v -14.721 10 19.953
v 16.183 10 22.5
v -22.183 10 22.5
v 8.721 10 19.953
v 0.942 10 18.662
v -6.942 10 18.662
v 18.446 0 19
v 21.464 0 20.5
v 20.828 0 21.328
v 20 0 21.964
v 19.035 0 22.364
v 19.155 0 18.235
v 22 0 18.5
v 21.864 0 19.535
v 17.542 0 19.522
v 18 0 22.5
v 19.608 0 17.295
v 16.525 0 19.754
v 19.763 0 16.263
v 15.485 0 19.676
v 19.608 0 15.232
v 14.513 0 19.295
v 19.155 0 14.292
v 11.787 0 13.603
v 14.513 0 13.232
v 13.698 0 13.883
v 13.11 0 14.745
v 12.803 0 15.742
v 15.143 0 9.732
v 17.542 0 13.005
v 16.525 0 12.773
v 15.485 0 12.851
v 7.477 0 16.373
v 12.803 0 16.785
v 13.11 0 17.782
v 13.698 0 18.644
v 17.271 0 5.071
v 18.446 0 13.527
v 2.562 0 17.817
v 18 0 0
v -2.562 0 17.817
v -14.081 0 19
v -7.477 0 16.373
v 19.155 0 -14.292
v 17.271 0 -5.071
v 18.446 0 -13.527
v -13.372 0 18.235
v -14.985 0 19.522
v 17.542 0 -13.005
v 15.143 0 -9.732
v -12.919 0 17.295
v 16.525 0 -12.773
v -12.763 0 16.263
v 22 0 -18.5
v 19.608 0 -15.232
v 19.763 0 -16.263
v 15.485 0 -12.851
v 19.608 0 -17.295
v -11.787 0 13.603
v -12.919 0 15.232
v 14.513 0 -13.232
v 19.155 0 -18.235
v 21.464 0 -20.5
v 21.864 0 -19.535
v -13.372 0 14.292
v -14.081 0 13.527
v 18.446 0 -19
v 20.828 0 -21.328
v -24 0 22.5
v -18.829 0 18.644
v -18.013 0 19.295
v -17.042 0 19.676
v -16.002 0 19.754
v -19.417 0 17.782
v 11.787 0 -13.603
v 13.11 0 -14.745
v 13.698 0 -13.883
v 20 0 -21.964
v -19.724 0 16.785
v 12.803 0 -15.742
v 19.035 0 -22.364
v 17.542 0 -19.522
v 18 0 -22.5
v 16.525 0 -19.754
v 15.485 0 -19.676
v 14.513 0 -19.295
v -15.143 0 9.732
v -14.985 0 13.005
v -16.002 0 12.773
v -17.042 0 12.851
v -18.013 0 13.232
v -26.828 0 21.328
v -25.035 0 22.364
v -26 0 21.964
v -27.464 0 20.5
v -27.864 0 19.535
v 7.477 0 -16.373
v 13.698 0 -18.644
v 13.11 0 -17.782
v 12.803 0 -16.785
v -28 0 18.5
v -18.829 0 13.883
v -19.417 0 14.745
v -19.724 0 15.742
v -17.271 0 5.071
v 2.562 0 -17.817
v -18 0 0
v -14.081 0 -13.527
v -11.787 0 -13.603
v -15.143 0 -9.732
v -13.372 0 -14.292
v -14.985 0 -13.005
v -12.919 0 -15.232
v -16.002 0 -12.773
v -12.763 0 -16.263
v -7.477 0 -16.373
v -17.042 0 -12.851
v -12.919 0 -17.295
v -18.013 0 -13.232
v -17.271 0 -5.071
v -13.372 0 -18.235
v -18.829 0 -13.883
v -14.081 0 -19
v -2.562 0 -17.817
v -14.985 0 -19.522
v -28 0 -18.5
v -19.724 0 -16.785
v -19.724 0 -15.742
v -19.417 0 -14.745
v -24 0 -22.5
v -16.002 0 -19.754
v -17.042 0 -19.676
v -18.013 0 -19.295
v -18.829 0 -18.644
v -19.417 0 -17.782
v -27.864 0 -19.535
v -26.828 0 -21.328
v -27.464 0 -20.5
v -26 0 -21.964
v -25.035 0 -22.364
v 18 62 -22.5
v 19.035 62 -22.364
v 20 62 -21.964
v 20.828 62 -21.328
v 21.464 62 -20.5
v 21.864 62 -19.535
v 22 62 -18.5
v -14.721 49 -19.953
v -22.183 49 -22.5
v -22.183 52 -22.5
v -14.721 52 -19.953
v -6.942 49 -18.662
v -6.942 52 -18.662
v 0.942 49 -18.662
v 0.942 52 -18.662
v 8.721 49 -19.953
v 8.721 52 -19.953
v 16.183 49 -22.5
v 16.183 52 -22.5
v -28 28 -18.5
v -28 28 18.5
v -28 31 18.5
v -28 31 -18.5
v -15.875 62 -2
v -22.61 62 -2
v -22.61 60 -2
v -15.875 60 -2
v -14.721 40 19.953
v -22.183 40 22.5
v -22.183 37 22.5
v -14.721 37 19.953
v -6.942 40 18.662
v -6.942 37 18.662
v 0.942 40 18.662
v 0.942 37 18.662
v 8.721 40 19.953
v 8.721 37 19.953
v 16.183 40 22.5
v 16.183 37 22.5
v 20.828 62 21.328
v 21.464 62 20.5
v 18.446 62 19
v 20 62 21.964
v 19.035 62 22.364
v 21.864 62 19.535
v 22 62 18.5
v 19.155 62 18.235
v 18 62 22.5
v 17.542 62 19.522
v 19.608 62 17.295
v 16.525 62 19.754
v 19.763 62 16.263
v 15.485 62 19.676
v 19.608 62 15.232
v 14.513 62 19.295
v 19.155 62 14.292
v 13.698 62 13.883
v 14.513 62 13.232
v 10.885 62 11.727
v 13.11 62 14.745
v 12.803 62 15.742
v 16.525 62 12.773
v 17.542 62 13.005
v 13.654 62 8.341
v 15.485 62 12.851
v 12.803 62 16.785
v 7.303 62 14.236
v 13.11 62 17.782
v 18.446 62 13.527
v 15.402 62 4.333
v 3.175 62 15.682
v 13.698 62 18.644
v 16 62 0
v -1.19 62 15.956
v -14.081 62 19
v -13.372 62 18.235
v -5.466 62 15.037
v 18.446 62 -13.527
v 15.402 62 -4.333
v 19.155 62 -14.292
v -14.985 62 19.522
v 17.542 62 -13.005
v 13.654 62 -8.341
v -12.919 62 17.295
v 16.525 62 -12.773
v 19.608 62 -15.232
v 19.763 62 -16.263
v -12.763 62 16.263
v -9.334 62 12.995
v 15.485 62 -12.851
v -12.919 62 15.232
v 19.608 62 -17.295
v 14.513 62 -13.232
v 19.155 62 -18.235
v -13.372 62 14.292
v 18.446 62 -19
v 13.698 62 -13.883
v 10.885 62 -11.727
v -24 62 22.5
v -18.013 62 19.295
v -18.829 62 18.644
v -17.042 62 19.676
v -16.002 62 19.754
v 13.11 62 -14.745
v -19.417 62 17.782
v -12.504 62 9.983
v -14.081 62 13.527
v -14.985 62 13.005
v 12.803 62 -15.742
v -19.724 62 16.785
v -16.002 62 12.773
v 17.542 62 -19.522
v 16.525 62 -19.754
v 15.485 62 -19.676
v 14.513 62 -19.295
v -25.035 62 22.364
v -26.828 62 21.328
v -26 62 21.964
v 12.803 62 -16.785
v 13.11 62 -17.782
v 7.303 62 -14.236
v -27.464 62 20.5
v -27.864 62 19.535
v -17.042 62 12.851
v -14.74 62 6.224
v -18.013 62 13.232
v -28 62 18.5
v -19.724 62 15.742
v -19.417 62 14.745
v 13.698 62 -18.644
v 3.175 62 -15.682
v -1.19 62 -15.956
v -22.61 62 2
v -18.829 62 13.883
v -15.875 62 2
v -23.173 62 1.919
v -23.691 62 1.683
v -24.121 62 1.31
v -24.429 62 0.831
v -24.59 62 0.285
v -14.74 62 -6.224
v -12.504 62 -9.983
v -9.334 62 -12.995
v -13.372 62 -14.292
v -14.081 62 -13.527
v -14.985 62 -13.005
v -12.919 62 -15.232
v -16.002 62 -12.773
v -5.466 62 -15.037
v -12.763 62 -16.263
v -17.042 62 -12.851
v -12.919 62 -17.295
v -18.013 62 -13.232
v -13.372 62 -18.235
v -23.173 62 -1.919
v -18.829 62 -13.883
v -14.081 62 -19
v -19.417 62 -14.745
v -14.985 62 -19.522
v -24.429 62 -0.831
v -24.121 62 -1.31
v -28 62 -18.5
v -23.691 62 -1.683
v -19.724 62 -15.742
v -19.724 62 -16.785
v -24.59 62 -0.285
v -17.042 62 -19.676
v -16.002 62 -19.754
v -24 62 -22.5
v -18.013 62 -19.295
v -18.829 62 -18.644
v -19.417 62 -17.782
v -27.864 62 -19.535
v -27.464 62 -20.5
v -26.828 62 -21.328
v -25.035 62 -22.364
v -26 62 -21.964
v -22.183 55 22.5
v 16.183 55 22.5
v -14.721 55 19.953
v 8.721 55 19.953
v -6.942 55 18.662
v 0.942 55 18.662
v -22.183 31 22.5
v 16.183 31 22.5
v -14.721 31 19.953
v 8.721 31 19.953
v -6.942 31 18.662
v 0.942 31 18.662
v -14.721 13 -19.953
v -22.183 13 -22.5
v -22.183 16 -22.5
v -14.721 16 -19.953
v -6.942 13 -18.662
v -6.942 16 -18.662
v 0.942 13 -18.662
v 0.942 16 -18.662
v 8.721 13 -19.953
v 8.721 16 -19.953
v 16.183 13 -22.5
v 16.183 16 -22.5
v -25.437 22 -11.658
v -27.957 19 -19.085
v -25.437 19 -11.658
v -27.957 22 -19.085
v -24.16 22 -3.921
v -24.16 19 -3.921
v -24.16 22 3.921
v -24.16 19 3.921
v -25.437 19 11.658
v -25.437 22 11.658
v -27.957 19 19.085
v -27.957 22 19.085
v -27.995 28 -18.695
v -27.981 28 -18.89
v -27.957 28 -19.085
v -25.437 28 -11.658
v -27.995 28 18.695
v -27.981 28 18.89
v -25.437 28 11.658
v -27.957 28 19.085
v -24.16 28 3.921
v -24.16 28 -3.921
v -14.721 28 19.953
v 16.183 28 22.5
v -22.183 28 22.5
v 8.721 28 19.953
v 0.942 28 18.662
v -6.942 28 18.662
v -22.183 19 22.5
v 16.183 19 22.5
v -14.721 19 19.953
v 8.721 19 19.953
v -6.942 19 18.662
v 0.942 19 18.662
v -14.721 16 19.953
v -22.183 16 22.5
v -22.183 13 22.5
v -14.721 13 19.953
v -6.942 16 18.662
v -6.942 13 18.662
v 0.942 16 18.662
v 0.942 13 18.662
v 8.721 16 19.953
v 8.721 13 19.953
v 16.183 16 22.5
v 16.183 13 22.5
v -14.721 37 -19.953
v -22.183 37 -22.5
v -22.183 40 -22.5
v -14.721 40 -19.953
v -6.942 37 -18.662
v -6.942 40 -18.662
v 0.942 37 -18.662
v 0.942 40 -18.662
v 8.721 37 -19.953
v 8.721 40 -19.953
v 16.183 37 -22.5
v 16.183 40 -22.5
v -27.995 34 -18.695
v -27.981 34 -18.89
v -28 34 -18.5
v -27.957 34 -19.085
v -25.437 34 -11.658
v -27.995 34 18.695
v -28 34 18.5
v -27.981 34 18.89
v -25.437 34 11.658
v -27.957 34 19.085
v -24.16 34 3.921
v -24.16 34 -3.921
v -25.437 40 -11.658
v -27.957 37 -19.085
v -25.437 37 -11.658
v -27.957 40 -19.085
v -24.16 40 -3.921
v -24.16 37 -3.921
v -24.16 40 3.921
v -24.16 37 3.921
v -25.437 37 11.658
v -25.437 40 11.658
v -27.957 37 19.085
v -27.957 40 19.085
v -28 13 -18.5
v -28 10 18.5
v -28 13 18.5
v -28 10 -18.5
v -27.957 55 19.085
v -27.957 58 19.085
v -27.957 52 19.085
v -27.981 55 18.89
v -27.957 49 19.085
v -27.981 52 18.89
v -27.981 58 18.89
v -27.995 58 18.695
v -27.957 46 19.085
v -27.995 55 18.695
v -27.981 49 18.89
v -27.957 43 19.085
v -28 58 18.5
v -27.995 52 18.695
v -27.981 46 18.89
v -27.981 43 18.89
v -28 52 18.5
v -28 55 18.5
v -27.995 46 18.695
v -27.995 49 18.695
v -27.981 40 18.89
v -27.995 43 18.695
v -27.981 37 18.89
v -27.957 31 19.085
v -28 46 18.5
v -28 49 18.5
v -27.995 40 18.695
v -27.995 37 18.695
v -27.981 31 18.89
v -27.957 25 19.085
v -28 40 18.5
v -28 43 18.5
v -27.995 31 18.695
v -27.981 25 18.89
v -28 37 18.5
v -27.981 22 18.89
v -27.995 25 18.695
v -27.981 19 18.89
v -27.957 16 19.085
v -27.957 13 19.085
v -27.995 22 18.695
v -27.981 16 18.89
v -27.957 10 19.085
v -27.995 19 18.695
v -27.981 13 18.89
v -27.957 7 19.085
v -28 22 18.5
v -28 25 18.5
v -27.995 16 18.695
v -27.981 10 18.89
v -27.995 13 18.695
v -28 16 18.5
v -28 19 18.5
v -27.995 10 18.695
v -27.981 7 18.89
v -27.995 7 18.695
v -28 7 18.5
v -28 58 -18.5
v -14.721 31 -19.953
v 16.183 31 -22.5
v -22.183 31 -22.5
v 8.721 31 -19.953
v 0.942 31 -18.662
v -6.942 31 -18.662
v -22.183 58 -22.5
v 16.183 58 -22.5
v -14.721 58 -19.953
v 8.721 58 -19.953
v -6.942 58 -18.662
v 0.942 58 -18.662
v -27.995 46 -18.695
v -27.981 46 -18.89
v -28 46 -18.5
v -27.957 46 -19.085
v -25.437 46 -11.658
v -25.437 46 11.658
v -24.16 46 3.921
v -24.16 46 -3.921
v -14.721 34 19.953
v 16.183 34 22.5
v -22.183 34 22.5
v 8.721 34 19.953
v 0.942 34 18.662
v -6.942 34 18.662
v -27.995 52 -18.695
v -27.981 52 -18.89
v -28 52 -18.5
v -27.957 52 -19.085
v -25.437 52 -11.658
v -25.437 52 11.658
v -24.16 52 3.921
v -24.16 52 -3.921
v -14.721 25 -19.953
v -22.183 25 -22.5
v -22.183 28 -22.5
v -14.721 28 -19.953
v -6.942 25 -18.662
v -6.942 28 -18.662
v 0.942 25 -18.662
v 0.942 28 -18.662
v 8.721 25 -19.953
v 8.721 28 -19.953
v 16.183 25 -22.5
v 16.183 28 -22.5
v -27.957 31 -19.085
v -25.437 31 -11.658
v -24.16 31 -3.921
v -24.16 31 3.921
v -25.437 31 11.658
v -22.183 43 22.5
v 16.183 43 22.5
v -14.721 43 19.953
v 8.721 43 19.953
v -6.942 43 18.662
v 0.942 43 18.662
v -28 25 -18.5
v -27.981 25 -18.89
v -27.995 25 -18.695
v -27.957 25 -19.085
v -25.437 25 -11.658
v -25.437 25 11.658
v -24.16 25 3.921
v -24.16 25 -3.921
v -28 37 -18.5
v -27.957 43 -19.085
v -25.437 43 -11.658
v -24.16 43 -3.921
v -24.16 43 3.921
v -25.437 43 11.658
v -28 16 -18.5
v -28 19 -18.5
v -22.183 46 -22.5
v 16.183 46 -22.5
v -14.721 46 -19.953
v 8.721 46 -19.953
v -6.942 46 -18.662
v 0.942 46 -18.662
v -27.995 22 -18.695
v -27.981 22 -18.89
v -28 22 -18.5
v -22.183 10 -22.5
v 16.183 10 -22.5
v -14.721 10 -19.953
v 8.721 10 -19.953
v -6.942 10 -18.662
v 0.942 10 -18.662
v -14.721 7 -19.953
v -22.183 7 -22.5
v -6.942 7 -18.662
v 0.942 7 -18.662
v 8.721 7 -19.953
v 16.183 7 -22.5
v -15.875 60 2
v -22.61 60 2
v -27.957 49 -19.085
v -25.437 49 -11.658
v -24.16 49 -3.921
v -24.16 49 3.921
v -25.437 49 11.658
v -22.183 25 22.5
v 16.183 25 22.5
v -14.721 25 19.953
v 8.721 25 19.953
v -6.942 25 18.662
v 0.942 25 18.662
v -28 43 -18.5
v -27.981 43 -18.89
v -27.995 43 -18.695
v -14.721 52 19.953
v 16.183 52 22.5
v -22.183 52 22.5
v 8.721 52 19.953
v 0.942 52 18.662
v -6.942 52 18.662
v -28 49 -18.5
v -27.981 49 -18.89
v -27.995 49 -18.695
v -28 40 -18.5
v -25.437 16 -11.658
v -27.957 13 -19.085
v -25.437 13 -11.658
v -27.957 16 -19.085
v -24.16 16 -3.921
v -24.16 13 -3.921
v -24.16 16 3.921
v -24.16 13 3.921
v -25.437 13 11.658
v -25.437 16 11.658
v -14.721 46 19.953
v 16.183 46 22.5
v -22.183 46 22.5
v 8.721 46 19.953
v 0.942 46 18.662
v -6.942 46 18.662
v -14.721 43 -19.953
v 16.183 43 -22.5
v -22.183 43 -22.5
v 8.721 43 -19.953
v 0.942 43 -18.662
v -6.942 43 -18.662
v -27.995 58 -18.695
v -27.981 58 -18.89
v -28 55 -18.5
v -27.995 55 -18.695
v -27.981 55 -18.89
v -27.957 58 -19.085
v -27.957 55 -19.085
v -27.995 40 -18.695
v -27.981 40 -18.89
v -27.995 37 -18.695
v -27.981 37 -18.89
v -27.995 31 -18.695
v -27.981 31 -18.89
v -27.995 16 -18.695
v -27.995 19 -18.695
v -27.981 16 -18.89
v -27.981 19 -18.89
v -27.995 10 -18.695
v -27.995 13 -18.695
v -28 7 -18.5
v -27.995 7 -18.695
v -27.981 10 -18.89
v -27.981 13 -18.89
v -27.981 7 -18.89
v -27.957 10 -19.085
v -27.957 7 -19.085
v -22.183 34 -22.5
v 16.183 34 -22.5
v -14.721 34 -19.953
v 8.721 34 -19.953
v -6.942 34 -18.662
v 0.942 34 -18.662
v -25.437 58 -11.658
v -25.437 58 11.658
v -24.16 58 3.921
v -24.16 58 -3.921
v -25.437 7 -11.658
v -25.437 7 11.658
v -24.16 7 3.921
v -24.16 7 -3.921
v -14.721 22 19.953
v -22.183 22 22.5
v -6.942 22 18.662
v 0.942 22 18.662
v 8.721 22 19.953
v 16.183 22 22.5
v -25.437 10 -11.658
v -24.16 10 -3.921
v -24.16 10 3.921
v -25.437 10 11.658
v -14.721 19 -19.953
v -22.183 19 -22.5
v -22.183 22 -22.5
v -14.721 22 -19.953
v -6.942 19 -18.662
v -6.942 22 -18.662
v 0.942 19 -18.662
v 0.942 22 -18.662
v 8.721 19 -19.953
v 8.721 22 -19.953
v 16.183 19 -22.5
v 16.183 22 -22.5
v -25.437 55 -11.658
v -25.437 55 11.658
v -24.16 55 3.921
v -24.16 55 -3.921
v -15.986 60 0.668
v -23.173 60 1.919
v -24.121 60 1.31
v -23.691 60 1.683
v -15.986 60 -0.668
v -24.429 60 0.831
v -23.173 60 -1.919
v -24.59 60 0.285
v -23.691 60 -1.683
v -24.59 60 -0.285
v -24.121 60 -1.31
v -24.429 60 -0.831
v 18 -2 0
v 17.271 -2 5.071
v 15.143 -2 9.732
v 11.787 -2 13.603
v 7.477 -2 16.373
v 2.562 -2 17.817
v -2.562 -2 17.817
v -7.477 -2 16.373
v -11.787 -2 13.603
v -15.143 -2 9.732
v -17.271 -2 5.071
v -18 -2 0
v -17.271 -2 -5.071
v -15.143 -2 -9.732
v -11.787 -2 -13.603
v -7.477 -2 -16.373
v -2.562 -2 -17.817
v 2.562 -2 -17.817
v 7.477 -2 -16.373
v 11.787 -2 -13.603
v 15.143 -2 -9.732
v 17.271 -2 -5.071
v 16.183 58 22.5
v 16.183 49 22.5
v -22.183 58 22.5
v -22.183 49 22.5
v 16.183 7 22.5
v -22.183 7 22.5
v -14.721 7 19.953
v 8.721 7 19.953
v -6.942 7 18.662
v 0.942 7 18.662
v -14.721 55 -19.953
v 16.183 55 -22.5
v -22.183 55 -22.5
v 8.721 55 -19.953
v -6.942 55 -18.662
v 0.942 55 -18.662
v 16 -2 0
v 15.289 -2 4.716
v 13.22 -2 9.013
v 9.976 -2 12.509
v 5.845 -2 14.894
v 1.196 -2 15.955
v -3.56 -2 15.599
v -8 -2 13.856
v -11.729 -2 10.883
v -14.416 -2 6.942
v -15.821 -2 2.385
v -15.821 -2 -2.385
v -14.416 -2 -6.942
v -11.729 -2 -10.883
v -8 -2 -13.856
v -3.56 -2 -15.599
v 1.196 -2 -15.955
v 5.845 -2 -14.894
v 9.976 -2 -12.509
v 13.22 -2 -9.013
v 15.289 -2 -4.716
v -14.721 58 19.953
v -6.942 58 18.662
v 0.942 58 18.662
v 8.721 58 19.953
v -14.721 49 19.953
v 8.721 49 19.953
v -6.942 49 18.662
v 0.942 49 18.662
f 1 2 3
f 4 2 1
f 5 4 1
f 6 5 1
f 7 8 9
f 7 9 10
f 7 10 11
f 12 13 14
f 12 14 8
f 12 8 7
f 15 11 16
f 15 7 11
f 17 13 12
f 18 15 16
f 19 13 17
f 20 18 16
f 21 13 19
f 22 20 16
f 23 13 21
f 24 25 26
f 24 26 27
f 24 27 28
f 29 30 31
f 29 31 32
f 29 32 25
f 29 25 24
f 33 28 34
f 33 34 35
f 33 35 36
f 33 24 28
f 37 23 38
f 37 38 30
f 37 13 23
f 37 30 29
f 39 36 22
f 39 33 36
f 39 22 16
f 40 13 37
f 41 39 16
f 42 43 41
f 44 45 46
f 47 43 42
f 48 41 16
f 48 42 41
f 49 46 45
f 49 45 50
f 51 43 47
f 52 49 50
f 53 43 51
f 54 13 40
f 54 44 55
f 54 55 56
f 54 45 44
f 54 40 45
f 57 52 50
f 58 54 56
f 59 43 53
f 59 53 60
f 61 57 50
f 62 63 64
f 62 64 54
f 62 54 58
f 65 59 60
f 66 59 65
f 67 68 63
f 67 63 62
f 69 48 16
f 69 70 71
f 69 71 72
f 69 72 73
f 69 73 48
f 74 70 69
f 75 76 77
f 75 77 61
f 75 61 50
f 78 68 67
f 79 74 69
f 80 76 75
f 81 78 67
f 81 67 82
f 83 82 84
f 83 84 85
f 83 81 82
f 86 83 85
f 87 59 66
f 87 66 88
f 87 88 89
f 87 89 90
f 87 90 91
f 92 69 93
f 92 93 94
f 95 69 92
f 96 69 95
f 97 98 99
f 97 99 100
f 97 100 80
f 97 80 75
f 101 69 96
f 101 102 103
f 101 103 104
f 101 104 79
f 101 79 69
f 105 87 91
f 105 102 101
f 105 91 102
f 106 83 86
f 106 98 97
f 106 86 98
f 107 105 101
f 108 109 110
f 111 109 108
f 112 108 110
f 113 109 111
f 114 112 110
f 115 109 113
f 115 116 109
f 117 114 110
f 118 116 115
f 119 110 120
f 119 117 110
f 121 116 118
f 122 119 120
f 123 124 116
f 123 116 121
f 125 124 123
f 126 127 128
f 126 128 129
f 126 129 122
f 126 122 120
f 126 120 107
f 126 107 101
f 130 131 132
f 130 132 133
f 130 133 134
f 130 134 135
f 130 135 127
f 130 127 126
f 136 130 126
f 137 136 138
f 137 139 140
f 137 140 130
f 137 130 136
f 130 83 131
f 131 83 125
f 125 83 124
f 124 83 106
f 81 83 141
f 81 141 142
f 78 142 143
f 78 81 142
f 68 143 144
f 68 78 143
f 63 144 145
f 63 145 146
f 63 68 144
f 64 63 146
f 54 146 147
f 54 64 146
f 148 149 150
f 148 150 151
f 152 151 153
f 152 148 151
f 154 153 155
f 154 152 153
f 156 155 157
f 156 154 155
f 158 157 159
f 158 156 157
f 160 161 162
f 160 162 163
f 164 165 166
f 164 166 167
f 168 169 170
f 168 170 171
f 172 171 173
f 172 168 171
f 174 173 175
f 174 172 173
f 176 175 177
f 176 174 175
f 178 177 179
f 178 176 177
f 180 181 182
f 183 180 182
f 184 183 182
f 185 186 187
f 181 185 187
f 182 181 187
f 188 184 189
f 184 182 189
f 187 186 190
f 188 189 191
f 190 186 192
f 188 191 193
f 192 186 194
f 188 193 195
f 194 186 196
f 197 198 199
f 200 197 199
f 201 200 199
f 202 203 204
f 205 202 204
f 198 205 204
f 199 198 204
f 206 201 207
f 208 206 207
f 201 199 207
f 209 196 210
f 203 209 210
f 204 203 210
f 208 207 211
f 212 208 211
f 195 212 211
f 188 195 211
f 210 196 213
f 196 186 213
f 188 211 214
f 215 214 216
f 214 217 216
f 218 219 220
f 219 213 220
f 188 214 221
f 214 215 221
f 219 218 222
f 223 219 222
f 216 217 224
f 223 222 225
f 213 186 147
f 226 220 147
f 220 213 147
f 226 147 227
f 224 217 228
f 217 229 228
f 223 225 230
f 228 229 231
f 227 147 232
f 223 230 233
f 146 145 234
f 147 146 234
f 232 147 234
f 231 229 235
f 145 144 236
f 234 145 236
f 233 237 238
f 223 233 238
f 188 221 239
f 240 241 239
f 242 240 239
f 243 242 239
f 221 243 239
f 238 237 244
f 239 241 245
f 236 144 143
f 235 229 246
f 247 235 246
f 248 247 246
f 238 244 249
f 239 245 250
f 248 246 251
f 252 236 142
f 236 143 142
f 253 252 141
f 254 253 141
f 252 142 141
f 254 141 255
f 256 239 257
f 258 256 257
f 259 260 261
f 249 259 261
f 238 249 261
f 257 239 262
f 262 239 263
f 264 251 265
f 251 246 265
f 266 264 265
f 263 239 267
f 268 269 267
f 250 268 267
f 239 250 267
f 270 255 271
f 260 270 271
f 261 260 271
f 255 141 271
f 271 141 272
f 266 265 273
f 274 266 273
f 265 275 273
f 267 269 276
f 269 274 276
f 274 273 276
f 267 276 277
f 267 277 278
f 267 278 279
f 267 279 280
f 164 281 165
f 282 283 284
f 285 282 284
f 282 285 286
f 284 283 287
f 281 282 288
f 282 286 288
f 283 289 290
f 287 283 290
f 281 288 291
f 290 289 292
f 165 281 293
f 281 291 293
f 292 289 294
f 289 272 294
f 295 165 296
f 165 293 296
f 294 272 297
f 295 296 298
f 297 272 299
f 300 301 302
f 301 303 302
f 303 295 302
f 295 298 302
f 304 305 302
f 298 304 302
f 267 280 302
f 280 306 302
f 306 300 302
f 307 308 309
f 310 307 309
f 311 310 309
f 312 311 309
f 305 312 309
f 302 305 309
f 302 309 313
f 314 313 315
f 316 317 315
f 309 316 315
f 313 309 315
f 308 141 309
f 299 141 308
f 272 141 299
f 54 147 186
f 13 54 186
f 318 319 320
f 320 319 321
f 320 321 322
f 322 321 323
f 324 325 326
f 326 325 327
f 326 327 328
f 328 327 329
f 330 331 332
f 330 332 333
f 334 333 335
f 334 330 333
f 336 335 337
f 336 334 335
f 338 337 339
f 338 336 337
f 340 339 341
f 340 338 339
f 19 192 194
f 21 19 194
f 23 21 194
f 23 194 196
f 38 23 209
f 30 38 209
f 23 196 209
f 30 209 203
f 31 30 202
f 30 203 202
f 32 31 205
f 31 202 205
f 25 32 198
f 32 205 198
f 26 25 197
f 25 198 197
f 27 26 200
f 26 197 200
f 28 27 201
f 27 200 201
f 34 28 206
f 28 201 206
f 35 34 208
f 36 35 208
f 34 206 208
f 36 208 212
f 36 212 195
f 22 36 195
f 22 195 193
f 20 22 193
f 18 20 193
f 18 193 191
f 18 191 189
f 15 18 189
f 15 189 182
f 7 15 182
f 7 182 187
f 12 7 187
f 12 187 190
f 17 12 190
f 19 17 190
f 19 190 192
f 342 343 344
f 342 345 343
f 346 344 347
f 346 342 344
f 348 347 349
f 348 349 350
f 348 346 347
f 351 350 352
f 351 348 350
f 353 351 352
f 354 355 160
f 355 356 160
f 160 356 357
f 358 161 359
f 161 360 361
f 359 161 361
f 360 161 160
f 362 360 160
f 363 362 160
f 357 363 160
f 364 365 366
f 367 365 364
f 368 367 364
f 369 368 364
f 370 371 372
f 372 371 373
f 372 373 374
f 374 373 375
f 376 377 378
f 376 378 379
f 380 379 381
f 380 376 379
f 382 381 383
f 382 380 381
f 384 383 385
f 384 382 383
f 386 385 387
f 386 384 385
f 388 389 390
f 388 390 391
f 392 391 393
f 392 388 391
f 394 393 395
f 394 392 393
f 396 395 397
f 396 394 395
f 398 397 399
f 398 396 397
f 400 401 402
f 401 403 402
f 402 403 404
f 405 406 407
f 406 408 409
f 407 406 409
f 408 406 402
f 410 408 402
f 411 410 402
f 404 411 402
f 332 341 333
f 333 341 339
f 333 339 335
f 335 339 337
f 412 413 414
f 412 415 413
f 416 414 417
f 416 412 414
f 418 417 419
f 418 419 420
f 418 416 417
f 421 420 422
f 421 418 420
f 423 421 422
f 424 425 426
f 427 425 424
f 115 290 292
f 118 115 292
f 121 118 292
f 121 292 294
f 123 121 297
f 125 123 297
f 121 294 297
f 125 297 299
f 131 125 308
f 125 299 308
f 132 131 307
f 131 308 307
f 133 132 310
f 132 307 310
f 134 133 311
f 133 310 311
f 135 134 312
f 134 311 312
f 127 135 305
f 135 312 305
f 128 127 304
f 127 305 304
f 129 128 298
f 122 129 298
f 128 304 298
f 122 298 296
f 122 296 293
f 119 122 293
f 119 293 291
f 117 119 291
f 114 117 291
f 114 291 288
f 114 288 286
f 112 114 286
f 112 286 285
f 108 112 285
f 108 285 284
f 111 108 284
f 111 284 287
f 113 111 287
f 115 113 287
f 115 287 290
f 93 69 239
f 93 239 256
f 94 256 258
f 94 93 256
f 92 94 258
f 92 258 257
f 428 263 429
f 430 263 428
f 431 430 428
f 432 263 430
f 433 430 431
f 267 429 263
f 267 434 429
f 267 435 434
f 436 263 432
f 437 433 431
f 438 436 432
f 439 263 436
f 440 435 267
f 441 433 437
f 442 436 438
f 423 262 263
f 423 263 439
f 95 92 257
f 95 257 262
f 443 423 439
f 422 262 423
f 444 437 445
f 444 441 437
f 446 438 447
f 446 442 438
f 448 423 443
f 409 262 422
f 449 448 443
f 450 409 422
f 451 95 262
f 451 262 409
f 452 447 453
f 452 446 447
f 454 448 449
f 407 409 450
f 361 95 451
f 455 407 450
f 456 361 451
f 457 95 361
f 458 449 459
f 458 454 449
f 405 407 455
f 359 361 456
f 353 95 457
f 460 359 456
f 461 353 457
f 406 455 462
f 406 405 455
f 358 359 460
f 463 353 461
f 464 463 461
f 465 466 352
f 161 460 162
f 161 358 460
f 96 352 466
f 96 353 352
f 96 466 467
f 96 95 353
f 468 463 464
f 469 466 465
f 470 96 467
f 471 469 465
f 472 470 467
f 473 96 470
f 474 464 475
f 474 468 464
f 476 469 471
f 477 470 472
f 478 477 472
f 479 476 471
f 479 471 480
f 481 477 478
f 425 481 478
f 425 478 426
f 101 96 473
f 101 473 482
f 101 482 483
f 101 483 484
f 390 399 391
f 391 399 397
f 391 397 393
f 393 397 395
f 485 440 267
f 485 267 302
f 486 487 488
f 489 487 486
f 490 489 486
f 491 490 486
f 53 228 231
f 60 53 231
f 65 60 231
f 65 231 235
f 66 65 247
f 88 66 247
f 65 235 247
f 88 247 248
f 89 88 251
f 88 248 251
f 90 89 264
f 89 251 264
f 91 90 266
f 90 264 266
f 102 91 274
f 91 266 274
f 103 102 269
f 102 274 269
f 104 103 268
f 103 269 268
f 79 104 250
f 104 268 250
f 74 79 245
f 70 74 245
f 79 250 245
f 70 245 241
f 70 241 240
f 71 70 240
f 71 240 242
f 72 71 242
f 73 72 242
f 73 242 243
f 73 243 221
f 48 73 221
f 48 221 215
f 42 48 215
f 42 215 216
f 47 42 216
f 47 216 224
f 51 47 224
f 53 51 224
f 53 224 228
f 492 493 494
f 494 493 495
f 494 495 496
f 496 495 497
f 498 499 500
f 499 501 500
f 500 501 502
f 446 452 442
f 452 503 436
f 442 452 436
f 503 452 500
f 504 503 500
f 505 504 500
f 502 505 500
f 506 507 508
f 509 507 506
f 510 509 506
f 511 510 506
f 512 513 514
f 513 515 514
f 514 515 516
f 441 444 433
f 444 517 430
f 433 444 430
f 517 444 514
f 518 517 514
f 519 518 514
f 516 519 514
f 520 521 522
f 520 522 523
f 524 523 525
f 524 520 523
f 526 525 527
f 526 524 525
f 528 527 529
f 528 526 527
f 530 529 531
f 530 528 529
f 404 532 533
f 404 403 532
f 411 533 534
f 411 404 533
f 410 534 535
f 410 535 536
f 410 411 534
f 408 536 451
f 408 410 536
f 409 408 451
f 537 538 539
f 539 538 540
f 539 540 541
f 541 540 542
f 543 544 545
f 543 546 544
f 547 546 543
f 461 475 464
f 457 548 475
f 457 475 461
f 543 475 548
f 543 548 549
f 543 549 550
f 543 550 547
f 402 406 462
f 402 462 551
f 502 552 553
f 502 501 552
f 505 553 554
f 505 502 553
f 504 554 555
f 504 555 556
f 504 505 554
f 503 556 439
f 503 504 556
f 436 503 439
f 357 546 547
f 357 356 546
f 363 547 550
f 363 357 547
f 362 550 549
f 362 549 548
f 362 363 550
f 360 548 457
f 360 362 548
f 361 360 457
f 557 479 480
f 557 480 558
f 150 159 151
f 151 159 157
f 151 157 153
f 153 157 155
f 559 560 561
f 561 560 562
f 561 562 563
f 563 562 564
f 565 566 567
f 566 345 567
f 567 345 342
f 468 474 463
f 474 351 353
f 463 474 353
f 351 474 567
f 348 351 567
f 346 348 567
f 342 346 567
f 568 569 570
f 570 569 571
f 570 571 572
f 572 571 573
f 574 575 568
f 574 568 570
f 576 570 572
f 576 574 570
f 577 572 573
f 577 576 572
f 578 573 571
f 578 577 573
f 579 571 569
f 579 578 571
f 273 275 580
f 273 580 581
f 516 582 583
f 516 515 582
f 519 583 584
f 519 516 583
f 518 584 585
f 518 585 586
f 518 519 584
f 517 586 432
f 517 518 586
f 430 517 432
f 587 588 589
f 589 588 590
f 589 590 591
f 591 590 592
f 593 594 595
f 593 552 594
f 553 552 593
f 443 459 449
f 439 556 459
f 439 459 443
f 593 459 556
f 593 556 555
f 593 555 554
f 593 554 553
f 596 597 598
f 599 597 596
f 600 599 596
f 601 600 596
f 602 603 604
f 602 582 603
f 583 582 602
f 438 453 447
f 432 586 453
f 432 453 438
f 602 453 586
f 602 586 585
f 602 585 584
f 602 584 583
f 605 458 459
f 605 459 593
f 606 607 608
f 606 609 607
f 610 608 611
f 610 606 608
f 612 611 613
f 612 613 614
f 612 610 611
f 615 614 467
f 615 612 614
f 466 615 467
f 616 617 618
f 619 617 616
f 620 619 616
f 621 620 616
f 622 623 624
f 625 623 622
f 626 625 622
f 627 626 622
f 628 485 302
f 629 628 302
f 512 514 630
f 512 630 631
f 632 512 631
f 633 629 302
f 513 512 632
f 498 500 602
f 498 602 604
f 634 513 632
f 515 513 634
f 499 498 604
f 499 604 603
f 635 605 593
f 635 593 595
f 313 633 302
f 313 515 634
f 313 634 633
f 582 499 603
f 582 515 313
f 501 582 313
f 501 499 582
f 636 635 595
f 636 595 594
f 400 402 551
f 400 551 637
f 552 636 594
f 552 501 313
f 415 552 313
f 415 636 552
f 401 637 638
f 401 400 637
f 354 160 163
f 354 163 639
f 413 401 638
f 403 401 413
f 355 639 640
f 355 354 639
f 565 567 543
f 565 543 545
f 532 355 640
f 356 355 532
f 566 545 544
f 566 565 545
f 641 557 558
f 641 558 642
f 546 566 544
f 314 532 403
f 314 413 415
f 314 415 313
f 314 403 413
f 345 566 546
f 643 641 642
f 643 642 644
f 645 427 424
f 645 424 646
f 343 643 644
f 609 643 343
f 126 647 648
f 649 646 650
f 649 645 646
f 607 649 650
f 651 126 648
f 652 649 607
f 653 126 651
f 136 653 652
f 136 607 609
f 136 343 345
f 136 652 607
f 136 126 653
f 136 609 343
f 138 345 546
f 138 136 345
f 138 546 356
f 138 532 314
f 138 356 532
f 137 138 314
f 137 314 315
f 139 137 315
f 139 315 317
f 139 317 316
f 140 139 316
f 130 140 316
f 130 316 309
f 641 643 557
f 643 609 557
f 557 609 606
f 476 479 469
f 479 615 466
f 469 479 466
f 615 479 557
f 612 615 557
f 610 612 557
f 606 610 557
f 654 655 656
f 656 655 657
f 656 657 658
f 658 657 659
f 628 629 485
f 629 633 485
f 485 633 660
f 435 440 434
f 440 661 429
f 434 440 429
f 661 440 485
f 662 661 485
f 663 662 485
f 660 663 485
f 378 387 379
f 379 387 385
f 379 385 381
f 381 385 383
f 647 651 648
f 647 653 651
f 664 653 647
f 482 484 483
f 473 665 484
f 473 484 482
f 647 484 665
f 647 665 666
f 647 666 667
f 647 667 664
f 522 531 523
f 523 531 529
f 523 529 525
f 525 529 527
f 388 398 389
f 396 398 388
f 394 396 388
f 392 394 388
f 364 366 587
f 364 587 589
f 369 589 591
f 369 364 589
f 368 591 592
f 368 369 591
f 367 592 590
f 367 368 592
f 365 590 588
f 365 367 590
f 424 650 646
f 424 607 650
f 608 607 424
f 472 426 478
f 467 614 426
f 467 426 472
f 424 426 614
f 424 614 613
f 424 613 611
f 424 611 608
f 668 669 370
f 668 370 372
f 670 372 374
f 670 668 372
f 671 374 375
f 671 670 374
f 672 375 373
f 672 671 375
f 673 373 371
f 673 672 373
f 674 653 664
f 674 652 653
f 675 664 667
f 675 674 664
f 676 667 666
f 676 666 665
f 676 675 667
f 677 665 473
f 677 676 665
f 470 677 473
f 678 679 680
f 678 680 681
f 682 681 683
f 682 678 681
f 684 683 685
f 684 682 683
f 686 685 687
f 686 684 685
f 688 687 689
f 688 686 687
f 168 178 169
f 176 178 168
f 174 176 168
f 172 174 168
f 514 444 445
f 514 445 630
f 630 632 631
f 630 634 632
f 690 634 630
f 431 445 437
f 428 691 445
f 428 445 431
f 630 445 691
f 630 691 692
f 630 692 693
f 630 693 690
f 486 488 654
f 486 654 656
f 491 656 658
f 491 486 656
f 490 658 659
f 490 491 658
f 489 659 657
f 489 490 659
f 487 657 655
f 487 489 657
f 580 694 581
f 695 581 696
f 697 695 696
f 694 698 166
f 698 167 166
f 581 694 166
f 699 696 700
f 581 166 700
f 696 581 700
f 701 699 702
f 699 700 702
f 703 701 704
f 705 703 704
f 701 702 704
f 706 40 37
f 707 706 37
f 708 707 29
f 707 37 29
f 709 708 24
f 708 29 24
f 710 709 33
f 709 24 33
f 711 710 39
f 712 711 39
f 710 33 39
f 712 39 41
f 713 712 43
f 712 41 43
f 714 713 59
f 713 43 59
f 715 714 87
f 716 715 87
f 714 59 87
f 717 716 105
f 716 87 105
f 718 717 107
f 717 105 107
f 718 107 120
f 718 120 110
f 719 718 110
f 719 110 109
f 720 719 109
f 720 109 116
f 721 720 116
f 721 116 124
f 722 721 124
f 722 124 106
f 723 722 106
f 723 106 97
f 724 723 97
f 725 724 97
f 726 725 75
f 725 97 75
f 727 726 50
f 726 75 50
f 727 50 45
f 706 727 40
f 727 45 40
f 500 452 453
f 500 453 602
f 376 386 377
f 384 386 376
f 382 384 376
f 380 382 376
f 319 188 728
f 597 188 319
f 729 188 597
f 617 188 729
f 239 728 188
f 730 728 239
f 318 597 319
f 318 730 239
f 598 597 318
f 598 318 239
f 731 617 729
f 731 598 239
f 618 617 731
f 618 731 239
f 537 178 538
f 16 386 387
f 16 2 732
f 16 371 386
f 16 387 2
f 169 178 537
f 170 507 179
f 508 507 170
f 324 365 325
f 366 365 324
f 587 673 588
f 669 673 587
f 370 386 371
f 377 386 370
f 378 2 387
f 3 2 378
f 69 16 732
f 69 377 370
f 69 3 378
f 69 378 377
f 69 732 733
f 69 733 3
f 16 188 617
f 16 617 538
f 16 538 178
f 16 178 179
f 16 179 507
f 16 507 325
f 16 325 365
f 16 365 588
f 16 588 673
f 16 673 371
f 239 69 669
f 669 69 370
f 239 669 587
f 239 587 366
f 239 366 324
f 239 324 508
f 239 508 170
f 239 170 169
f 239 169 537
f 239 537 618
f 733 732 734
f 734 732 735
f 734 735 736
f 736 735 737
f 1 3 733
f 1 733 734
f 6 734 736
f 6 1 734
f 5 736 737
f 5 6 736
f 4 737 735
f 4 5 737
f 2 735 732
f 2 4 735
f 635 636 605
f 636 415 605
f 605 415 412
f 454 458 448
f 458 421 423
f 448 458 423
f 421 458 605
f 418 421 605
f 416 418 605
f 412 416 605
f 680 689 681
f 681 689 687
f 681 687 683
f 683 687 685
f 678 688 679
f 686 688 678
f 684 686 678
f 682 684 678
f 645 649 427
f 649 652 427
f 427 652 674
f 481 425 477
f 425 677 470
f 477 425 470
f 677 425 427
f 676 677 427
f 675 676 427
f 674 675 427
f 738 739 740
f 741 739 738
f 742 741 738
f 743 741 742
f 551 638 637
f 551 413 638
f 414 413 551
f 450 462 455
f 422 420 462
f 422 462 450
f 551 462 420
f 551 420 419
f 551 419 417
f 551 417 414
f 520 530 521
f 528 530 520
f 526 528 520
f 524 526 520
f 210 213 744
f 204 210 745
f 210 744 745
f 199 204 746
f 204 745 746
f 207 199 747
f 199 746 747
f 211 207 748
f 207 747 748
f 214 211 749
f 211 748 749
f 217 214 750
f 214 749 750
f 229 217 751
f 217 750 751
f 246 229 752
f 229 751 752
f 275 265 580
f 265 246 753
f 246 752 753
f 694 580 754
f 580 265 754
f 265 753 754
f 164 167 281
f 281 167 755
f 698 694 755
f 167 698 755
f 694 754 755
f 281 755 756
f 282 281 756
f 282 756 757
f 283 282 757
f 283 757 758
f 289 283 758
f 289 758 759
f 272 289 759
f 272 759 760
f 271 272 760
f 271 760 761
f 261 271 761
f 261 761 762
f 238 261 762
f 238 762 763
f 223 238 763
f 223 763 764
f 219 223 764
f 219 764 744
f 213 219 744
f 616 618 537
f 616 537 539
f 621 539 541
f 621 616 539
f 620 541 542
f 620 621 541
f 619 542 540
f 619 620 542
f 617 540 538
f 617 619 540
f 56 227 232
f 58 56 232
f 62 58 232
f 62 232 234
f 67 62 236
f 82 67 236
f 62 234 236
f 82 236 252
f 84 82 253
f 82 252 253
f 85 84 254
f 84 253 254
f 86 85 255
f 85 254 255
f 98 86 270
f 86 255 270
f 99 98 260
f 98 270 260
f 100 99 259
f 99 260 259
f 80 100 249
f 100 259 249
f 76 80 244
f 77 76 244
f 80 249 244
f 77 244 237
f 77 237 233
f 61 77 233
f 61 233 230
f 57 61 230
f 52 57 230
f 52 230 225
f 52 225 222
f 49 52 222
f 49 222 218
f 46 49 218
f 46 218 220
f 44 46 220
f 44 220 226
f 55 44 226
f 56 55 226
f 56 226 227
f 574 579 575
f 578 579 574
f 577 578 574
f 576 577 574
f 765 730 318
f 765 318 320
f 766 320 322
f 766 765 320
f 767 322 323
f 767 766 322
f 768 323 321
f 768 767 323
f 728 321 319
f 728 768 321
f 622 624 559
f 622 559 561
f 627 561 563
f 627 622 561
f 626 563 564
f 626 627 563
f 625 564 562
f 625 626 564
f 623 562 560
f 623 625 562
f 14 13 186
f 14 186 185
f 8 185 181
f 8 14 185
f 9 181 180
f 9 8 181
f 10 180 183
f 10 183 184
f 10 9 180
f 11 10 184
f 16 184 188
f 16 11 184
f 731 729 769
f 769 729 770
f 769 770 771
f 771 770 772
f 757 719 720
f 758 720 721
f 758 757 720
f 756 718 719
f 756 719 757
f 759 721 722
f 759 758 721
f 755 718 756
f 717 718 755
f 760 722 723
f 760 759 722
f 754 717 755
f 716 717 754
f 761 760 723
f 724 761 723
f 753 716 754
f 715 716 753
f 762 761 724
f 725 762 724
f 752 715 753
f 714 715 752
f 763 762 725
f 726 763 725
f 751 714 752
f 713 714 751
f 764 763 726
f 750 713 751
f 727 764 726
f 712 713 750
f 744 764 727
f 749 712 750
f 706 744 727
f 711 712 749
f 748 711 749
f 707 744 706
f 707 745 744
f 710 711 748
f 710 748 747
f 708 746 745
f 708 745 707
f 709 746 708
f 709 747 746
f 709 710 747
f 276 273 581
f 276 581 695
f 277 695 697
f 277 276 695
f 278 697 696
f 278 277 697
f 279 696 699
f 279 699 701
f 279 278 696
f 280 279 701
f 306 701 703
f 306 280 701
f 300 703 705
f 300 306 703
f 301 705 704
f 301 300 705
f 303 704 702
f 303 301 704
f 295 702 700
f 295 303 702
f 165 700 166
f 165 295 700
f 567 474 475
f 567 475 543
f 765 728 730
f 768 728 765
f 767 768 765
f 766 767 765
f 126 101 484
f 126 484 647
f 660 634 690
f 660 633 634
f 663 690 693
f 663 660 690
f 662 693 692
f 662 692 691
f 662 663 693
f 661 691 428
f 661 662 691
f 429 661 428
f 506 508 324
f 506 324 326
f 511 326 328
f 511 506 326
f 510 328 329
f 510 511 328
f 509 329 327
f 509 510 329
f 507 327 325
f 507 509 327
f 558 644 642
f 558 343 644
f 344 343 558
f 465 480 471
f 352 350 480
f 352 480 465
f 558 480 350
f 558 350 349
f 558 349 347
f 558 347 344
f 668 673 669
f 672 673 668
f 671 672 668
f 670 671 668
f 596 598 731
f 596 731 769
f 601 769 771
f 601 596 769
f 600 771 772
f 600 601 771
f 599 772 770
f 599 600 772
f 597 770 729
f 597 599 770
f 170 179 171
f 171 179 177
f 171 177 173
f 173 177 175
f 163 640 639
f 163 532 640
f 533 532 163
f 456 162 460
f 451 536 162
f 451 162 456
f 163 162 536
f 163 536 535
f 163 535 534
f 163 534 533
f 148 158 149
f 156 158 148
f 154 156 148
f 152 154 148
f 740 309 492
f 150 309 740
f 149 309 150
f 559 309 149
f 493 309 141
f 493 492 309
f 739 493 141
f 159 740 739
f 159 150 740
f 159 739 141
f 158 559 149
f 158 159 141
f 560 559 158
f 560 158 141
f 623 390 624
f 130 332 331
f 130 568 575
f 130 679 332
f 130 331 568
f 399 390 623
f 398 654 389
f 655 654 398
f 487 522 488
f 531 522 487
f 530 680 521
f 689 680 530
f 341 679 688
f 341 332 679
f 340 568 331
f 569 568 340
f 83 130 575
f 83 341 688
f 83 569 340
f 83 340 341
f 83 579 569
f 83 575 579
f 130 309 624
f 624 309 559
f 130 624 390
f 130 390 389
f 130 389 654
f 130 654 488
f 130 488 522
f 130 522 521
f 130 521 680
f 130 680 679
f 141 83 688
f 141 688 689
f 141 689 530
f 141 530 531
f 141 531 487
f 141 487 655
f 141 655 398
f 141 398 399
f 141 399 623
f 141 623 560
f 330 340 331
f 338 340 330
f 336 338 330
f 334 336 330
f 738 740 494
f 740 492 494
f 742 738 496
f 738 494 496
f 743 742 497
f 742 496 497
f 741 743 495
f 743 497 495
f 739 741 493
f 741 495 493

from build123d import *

# Parameters (mm, degrees)
BOSS_EXTRUDE1_DEPTH     = 62
SKETCH2_R               = 18
BOSS_EXTRUDE2_DEPTH     = 2
SKETCH3_R               = 16
CUT_EXTRUDE1_DEPTH      = 65
CUT_EXTRUDE2_DEPTH      = 2
SKETCH6_R               = 3.5
CUT_EXTRUDE3_DEPTH      = 65
SKETCH7_W               = 48
SKETCH7_H               = 3
LPATTERN1_COUNT         = 9
LPATTERN1_PITCH         = 6
MIRROR1_COPY_1_SKETCH_W = 48
MIRROR1_COPY_1_SKETCH_H = 3
MIRROR1_COPY_2_SKETCH_W = 48
MIRROR1_COPY_2_SKETCH_H = 3
MIRROR1_COPY_3_SKETCH_W = 48
MIRROR1_COPY_3_SKETCH_H = 3
MIRROR1_COPY_4_SKETCH_W = 48
MIRROR1_COPY_4_SKETCH_H = 3
MIRROR1_COPY_5_SKETCH_W = 48
MIRROR1_COPY_5_SKETCH_H = 3
MIRROR1_COPY_6_SKETCH_W = 48
MIRROR1_COPY_6_SKETCH_H = 3
MIRROR1_COPY_7_SKETCH_W = 48
MIRROR1_COPY_7_SKETCH_H = 3
MIRROR1_COPY_8_SKETCH_W = 48
MIRROR1_COPY_8_SKETCH_H = 3
SKETCH9_W               = 48
SKETCH9_H               = 3
LPATTERN2_COUNT         = 9
LPATTERN2_PITCH         = 6


with BuildPart() as part:
    # Sketch1 → Boss-Extrude1 (new body)
    with BuildSketch(Plane(origin=(0, 0, 0), x_dir=(1, 0, 0), z_dir=(0, 1, 0))):
        with BuildLine():
            Line((-24, 22.5), (18, 22.5))
            ThreePointArc((18, 22.5), (20.828427125, 21.328427125), (22, 18.5))
            Line((22, 18.5), (22, -18.5))
            ThreePointArc((22, -18.5), (20.828427125, -21.328427125), (18, -22.5))
            Line((18, -22.5), (-24, -22.5))
            ThreePointArc((-24, -22.5), (-26.828427125, -21.328427125), (-28, -18.5))
            Line((-28, -18.5), (-28, 18.5))
            ThreePointArc((-28, 18.5), (-26.828427125, 21.328427125), (-24, 22.5))
        make_face()
    extrude(amount=BOSS_EXTRUDE1_DEPTH)

    # Sketch2 → Boss-Extrude2 (add)
    with BuildSketch(Plane.XZ):
        Circle(SKETCH2_R)
    extrude(amount=BOSS_EXTRUDE2_DEPTH)

    # Sketch3 → Cut-Extrude1 (cut, through all)
    with BuildSketch(Plane.XZ.offset(2)):
        Circle(SKETCH3_R)
    extrude(amount=-CUT_EXTRUDE1_DEPTH, mode=Mode.SUBTRACT)

    # Sketch5 → Cut-Extrude2 (cut)
    with BuildSketch(Plane(origin=(0, 62, 0), x_dir=(1, 0, 0), z_dir=(0, 1, 0))):
        with BuildLine():
            Line((-22.61, 2), (-11.427293838, 2))
            Line((-11.427293838, 2), (-11.427293838, -2))
            Line((-11.427293838, -2), (-22.61, -2))
            ThreePointArc((-22.61, -2), (-24.61, 0), (-22.61, 2))
        make_face()
    extrude(amount=-CUT_EXTRUDE2_DEPTH, mode=Mode.SUBTRACT)

    # Sketch6 → Cut-Extrude3 (cut, through all)
    with BuildSketch(Plane(origin=(0, 62, 0), x_dir=(1, 0, 0), z_dir=(0, 1, 0))):
        with Locations((16.263455967, 16.263455967)):
            Circle(SKETCH6_R)
        with Locations((16.263455967, -16.263455967)):
            Circle(SKETCH6_R)
        with Locations((-16.263455967, -16.263455967)):
            Circle(SKETCH6_R)
        with Locations((-16.263455967, 16.263455967)):
            Circle(SKETCH6_R)
    extrude(amount=-CUT_EXTRUDE3_DEPTH, mode=Mode.SUBTRACT)

    # Sketch7 → Cut-Revolve1 (revolve, cut)
    with BuildSketch(Plane(origin=(-3, 0, 0), x_dir=(0, 0, -1), z_dir=(1, 0, 0))):
        with Locations((-42.5, 56.5)):
            Rectangle(SKETCH7_W, SKETCH7_H)
    cut_revolve1 = revolve(axis=Axis((-3, 58, 66.5), (0, -1, 0)), mode=Mode.SUBTRACT)

    # LPattern1: Cut-Revolve1 ×9
    with Locations(*[(0, -i * LPATTERN1_PITCH, 0) for i in range(1, LPATTERN1_COUNT)]):
        add(cut_revolve1, mode=Mode.SUBTRACT)

    # Mirror1: Cut-Revolve1 across plane
    add(cut_revolve1.mirror(Plane.XY), mode=Mode.SUBTRACT)

    # Mirror1 copy 1 sketch → Mirror1 copy 1 (revolve, cut)
    with BuildSketch(Plane(origin=(-3, -6, 0), x_dir=(0, 0, 1), z_dir=(1, 0, 0))):
        with Locations((-42.5, -56.5)):
            Rectangle(MIRROR1_COPY_1_SKETCH_W, MIRROR1_COPY_1_SKETCH_H)
    revolve(axis=Axis((-3, 52, -66.5), (0, 1, 0)), mode=Mode.SUBTRACT)

    # Mirror1 copy 2 sketch → Mirror1 copy 2 (revolve, cut)
    with BuildSketch(Plane(origin=(-3, -12, 0), x_dir=(0, 0, 1), z_dir=(1, 0, 0))):
        with Locations((-42.5, -56.5)):
            Rectangle(MIRROR1_COPY_2_SKETCH_W, MIRROR1_COPY_2_SKETCH_H)
    revolve(axis=Axis((-3, 46, -66.5), (0, 1, 0)), mode=Mode.SUBTRACT)

    # Mirror1 copy 3 sketch → Mirror1 copy 3 (revolve, cut)
    with BuildSketch(Plane(origin=(-3, -18, 0), x_dir=(0, 0, 1), z_dir=(1, 0, 0))):
        with Locations((-42.5, -56.5)):
            Rectangle(MIRROR1_COPY_3_SKETCH_W, MIRROR1_COPY_3_SKETCH_H)
    revolve(axis=Axis((-3, 40, -66.5), (0, 1, 0)), mode=Mode.SUBTRACT)

    # Mirror1 copy 4 sketch → Mirror1 copy 4 (revolve, cut)
    with BuildSketch(Plane(origin=(-3, -24, 0), x_dir=(0, 0, 1), z_dir=(1, 0, 0))):
        with Locations((-42.5, -56.5)):
            Rectangle(MIRROR1_COPY_4_SKETCH_W, MIRROR1_COPY_4_SKETCH_H)
    revolve(axis=Axis((-3, 34, -66.5), (0, 1, 0)), mode=Mode.SUBTRACT)

    # Mirror1 copy 5 sketch → Mirror1 copy 5 (revolve, cut)
    with BuildSketch(Plane(origin=(-3, -30, 0), x_dir=(0, 0, 1), z_dir=(1, 0, 0))):
        with Locations((-42.5, -56.5)):
            Rectangle(MIRROR1_COPY_5_SKETCH_W, MIRROR1_COPY_5_SKETCH_H)
    revolve(axis=Axis((-3, 28, -66.5), (0, 1, 0)), mode=Mode.SUBTRACT)

    # Mirror1 copy 6 sketch → Mirror1 copy 6 (revolve, cut)
    with BuildSketch(Plane(origin=(-3, -36, 0), x_dir=(0, 0, 1), z_dir=(1, 0, 0))):
        with Locations((-42.5, -56.5)):
            Rectangle(MIRROR1_COPY_6_SKETCH_W, MIRROR1_COPY_6_SKETCH_H)
    revolve(axis=Axis((-3, 22, -66.5), (0, 1, 0)), mode=Mode.SUBTRACT)

    # Mirror1 copy 7 sketch → Mirror1 copy 7 (revolve, cut)
    with BuildSketch(Plane(origin=(-3, -42, 0), x_dir=(0, 0, 1), z_dir=(1, 0, 0))):
        with Locations((-42.5, -56.5)):
            Rectangle(MIRROR1_COPY_7_SKETCH_W, MIRROR1_COPY_7_SKETCH_H)
    revolve(axis=Axis((-3, 16, -66.5), (0, 1, 0)), mode=Mode.SUBTRACT)

    # Mirror1 copy 8 sketch → Mirror1 copy 8 (revolve, cut)
    with BuildSketch(Plane(origin=(-3, -48, 0), x_dir=(0, 0, 1), z_dir=(1, 0, 0))):
        with Locations((-42.5, -56.5)):
            Rectangle(MIRROR1_COPY_8_SKETCH_W, MIRROR1_COPY_8_SKETCH_H)
    revolve(axis=Axis((-3, 10, -66.5), (0, 1, 0)), mode=Mode.SUBTRACT)

    # Sketch9 → Cut-Revolve3 (revolve, cut)
    with BuildSketch(Plane.XY):
        with Locations((-48, 56.5)):
            Rectangle(SKETCH9_W, SKETCH9_H)
    cut_revolve3 = revolve(axis=Axis((-72, 58, 0), (0, -1, 0)), mode=Mode.SUBTRACT)

    # LPattern2: Cut-Revolve3 ×9
    with Locations(*[(0, -i * LPATTERN2_PITCH, 0) for i in range(1, LPATTERN2_COUNT)]):
        add(cut_revolve3, mode=Mode.SUBTRACT)


solid = part.part
